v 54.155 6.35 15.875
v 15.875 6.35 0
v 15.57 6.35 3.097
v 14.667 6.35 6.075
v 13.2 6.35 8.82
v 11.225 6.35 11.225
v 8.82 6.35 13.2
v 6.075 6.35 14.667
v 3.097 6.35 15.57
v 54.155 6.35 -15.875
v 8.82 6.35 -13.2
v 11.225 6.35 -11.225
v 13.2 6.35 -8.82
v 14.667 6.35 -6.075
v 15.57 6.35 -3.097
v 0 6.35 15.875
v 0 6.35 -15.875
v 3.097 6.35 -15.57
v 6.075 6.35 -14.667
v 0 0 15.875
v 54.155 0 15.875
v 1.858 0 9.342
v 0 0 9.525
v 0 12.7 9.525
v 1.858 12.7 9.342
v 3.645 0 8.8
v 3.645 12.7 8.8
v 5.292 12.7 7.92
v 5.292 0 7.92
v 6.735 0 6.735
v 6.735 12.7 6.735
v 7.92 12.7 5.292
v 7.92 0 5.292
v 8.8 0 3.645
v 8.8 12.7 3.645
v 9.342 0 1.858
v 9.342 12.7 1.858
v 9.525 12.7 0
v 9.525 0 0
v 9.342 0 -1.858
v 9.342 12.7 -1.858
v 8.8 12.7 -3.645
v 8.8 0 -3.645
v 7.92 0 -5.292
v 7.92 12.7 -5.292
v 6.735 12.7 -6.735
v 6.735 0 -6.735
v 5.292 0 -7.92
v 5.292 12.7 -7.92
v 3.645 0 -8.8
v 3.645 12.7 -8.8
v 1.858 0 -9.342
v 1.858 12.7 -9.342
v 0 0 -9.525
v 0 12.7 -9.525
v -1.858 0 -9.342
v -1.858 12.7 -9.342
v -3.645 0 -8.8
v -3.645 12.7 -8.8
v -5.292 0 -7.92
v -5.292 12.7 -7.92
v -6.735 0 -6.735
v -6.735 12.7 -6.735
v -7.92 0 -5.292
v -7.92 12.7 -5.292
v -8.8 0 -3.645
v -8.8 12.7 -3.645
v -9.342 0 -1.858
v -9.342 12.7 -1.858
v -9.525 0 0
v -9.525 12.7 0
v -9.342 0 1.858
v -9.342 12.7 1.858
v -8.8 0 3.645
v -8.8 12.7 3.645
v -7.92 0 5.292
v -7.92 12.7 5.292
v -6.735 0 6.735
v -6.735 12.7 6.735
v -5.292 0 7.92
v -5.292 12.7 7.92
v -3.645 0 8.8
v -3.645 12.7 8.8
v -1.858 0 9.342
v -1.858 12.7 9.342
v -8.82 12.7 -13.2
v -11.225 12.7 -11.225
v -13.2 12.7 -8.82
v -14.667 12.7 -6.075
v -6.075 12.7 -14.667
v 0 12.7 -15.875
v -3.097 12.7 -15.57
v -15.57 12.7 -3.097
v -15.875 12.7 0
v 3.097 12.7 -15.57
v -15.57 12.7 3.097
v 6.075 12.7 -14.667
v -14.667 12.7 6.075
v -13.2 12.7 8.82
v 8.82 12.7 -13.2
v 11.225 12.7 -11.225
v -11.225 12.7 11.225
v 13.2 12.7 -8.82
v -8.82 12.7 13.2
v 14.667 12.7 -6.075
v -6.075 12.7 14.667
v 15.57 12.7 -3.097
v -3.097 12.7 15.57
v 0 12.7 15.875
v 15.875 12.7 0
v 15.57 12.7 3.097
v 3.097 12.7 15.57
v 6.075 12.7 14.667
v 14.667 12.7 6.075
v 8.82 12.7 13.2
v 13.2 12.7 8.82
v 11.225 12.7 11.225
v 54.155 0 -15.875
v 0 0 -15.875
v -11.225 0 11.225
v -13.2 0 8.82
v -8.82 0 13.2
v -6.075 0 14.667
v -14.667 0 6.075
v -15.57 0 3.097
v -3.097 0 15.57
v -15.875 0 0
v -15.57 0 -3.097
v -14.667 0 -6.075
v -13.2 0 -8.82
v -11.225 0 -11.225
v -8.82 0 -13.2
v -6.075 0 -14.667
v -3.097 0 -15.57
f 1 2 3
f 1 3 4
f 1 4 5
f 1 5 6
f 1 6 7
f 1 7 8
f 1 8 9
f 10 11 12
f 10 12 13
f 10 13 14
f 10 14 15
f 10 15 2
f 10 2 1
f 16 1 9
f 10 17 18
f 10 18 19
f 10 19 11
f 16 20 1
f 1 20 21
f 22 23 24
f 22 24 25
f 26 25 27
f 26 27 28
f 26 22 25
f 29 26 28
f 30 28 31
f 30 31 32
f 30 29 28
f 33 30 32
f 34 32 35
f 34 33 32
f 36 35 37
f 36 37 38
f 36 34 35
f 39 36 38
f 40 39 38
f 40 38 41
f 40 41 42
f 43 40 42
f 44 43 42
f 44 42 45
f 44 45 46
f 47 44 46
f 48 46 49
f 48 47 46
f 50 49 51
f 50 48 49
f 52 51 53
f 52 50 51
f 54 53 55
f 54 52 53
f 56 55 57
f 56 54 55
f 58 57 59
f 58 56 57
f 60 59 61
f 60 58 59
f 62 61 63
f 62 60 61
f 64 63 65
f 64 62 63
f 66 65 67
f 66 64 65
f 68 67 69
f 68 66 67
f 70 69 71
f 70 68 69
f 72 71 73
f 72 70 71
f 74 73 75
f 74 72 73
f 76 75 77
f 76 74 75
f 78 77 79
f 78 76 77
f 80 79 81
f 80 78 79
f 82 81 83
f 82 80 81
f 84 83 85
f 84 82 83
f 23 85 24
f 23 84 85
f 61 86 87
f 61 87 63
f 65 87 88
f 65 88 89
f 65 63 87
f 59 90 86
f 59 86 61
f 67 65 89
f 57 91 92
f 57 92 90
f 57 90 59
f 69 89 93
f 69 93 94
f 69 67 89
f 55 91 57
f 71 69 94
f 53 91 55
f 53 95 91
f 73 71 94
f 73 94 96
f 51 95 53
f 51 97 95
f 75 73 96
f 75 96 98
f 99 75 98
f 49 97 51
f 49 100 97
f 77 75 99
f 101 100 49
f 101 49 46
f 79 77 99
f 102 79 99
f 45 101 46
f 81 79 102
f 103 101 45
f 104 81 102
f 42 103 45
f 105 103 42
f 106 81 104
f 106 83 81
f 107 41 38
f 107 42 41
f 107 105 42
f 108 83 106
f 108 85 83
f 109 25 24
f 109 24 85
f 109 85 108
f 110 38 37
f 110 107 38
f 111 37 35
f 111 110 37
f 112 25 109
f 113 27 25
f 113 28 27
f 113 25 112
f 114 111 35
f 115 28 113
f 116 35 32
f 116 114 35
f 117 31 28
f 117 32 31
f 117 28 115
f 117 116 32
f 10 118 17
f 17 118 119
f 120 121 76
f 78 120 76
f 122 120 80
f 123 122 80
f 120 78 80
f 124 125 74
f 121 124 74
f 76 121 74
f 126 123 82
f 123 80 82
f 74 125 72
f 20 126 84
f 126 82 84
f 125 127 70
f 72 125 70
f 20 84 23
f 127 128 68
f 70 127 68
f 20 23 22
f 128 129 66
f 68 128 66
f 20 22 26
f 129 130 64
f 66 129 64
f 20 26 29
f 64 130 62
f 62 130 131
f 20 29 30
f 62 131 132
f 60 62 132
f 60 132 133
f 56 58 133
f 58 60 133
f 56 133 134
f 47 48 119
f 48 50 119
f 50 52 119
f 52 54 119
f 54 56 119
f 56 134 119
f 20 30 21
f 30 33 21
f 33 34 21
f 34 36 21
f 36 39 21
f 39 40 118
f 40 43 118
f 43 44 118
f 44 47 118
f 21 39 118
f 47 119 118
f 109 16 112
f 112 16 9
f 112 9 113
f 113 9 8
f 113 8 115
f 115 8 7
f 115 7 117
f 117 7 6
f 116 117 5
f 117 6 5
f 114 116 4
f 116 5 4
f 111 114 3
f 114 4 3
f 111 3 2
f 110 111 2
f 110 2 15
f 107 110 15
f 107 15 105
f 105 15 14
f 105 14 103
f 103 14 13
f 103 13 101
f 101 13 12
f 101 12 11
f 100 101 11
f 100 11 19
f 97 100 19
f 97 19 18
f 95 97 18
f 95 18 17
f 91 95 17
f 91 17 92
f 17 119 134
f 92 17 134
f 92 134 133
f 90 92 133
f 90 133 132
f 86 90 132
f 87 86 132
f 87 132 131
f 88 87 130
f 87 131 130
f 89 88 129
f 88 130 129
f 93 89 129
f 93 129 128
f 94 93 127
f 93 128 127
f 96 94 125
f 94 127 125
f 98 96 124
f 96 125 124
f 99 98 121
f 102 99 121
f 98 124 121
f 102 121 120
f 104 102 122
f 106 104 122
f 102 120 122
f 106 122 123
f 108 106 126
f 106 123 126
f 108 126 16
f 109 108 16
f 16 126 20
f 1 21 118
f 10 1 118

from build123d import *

# Parameters (mm, degrees)
SKETCH1_R           = 9.525
BOSS_EXTRUDE1_DEPTH = 12.7
BOSS_EXTRUDE2_DEPTH = 6.35


with BuildPart() as part:
    # Sketch1 → Boss-Extrude1 (new body)
    with BuildSketch(Plane(origin=(0, 0, 0), x_dir=(1, 0, 0), z_dir=(0, 1, 0))):
        with BuildLine():
            ThreePointArc((0, 15.875), (-15.875, 0), (0, -15.875))
            ThreePointArc((0, -15.875), (11.225320151, -11.225320151), (15.875, 0))
            ThreePointArc((15.875, 0), (11.225320151, 11.225320151), (0, 15.875))
        make_face()
        Circle(SKETCH1_R, mode=Mode.SUBTRACT)
    extrude(amount=BOSS_EXTRUDE1_DEPTH)

    # Sketch1<6> → Boss-Extrude2 (add)
    with BuildSketch(Plane(origin=(0, 0, 0), x_dir=(1, 0, 0), z_dir=(0, 1, 0))):
        with BuildLine():
            ThreePointArc((15.875, 0), (11.225320151, -11.225320151), (0, -15.875))
            Line((0, -15.875), (54.154575014, -15.875))
            Line((54.154575014, -15.875), (54.154575014, 15.875))
            Line((54.154575014, 15.875), (0, 15.875))
            ThreePointArc((0, 15.875), (11.225320151, 11.225320151), (15.875, 0))
        make_face()
    extrude(amount=BOSS_EXTRUDE2_DEPTH)


solid = part.part
